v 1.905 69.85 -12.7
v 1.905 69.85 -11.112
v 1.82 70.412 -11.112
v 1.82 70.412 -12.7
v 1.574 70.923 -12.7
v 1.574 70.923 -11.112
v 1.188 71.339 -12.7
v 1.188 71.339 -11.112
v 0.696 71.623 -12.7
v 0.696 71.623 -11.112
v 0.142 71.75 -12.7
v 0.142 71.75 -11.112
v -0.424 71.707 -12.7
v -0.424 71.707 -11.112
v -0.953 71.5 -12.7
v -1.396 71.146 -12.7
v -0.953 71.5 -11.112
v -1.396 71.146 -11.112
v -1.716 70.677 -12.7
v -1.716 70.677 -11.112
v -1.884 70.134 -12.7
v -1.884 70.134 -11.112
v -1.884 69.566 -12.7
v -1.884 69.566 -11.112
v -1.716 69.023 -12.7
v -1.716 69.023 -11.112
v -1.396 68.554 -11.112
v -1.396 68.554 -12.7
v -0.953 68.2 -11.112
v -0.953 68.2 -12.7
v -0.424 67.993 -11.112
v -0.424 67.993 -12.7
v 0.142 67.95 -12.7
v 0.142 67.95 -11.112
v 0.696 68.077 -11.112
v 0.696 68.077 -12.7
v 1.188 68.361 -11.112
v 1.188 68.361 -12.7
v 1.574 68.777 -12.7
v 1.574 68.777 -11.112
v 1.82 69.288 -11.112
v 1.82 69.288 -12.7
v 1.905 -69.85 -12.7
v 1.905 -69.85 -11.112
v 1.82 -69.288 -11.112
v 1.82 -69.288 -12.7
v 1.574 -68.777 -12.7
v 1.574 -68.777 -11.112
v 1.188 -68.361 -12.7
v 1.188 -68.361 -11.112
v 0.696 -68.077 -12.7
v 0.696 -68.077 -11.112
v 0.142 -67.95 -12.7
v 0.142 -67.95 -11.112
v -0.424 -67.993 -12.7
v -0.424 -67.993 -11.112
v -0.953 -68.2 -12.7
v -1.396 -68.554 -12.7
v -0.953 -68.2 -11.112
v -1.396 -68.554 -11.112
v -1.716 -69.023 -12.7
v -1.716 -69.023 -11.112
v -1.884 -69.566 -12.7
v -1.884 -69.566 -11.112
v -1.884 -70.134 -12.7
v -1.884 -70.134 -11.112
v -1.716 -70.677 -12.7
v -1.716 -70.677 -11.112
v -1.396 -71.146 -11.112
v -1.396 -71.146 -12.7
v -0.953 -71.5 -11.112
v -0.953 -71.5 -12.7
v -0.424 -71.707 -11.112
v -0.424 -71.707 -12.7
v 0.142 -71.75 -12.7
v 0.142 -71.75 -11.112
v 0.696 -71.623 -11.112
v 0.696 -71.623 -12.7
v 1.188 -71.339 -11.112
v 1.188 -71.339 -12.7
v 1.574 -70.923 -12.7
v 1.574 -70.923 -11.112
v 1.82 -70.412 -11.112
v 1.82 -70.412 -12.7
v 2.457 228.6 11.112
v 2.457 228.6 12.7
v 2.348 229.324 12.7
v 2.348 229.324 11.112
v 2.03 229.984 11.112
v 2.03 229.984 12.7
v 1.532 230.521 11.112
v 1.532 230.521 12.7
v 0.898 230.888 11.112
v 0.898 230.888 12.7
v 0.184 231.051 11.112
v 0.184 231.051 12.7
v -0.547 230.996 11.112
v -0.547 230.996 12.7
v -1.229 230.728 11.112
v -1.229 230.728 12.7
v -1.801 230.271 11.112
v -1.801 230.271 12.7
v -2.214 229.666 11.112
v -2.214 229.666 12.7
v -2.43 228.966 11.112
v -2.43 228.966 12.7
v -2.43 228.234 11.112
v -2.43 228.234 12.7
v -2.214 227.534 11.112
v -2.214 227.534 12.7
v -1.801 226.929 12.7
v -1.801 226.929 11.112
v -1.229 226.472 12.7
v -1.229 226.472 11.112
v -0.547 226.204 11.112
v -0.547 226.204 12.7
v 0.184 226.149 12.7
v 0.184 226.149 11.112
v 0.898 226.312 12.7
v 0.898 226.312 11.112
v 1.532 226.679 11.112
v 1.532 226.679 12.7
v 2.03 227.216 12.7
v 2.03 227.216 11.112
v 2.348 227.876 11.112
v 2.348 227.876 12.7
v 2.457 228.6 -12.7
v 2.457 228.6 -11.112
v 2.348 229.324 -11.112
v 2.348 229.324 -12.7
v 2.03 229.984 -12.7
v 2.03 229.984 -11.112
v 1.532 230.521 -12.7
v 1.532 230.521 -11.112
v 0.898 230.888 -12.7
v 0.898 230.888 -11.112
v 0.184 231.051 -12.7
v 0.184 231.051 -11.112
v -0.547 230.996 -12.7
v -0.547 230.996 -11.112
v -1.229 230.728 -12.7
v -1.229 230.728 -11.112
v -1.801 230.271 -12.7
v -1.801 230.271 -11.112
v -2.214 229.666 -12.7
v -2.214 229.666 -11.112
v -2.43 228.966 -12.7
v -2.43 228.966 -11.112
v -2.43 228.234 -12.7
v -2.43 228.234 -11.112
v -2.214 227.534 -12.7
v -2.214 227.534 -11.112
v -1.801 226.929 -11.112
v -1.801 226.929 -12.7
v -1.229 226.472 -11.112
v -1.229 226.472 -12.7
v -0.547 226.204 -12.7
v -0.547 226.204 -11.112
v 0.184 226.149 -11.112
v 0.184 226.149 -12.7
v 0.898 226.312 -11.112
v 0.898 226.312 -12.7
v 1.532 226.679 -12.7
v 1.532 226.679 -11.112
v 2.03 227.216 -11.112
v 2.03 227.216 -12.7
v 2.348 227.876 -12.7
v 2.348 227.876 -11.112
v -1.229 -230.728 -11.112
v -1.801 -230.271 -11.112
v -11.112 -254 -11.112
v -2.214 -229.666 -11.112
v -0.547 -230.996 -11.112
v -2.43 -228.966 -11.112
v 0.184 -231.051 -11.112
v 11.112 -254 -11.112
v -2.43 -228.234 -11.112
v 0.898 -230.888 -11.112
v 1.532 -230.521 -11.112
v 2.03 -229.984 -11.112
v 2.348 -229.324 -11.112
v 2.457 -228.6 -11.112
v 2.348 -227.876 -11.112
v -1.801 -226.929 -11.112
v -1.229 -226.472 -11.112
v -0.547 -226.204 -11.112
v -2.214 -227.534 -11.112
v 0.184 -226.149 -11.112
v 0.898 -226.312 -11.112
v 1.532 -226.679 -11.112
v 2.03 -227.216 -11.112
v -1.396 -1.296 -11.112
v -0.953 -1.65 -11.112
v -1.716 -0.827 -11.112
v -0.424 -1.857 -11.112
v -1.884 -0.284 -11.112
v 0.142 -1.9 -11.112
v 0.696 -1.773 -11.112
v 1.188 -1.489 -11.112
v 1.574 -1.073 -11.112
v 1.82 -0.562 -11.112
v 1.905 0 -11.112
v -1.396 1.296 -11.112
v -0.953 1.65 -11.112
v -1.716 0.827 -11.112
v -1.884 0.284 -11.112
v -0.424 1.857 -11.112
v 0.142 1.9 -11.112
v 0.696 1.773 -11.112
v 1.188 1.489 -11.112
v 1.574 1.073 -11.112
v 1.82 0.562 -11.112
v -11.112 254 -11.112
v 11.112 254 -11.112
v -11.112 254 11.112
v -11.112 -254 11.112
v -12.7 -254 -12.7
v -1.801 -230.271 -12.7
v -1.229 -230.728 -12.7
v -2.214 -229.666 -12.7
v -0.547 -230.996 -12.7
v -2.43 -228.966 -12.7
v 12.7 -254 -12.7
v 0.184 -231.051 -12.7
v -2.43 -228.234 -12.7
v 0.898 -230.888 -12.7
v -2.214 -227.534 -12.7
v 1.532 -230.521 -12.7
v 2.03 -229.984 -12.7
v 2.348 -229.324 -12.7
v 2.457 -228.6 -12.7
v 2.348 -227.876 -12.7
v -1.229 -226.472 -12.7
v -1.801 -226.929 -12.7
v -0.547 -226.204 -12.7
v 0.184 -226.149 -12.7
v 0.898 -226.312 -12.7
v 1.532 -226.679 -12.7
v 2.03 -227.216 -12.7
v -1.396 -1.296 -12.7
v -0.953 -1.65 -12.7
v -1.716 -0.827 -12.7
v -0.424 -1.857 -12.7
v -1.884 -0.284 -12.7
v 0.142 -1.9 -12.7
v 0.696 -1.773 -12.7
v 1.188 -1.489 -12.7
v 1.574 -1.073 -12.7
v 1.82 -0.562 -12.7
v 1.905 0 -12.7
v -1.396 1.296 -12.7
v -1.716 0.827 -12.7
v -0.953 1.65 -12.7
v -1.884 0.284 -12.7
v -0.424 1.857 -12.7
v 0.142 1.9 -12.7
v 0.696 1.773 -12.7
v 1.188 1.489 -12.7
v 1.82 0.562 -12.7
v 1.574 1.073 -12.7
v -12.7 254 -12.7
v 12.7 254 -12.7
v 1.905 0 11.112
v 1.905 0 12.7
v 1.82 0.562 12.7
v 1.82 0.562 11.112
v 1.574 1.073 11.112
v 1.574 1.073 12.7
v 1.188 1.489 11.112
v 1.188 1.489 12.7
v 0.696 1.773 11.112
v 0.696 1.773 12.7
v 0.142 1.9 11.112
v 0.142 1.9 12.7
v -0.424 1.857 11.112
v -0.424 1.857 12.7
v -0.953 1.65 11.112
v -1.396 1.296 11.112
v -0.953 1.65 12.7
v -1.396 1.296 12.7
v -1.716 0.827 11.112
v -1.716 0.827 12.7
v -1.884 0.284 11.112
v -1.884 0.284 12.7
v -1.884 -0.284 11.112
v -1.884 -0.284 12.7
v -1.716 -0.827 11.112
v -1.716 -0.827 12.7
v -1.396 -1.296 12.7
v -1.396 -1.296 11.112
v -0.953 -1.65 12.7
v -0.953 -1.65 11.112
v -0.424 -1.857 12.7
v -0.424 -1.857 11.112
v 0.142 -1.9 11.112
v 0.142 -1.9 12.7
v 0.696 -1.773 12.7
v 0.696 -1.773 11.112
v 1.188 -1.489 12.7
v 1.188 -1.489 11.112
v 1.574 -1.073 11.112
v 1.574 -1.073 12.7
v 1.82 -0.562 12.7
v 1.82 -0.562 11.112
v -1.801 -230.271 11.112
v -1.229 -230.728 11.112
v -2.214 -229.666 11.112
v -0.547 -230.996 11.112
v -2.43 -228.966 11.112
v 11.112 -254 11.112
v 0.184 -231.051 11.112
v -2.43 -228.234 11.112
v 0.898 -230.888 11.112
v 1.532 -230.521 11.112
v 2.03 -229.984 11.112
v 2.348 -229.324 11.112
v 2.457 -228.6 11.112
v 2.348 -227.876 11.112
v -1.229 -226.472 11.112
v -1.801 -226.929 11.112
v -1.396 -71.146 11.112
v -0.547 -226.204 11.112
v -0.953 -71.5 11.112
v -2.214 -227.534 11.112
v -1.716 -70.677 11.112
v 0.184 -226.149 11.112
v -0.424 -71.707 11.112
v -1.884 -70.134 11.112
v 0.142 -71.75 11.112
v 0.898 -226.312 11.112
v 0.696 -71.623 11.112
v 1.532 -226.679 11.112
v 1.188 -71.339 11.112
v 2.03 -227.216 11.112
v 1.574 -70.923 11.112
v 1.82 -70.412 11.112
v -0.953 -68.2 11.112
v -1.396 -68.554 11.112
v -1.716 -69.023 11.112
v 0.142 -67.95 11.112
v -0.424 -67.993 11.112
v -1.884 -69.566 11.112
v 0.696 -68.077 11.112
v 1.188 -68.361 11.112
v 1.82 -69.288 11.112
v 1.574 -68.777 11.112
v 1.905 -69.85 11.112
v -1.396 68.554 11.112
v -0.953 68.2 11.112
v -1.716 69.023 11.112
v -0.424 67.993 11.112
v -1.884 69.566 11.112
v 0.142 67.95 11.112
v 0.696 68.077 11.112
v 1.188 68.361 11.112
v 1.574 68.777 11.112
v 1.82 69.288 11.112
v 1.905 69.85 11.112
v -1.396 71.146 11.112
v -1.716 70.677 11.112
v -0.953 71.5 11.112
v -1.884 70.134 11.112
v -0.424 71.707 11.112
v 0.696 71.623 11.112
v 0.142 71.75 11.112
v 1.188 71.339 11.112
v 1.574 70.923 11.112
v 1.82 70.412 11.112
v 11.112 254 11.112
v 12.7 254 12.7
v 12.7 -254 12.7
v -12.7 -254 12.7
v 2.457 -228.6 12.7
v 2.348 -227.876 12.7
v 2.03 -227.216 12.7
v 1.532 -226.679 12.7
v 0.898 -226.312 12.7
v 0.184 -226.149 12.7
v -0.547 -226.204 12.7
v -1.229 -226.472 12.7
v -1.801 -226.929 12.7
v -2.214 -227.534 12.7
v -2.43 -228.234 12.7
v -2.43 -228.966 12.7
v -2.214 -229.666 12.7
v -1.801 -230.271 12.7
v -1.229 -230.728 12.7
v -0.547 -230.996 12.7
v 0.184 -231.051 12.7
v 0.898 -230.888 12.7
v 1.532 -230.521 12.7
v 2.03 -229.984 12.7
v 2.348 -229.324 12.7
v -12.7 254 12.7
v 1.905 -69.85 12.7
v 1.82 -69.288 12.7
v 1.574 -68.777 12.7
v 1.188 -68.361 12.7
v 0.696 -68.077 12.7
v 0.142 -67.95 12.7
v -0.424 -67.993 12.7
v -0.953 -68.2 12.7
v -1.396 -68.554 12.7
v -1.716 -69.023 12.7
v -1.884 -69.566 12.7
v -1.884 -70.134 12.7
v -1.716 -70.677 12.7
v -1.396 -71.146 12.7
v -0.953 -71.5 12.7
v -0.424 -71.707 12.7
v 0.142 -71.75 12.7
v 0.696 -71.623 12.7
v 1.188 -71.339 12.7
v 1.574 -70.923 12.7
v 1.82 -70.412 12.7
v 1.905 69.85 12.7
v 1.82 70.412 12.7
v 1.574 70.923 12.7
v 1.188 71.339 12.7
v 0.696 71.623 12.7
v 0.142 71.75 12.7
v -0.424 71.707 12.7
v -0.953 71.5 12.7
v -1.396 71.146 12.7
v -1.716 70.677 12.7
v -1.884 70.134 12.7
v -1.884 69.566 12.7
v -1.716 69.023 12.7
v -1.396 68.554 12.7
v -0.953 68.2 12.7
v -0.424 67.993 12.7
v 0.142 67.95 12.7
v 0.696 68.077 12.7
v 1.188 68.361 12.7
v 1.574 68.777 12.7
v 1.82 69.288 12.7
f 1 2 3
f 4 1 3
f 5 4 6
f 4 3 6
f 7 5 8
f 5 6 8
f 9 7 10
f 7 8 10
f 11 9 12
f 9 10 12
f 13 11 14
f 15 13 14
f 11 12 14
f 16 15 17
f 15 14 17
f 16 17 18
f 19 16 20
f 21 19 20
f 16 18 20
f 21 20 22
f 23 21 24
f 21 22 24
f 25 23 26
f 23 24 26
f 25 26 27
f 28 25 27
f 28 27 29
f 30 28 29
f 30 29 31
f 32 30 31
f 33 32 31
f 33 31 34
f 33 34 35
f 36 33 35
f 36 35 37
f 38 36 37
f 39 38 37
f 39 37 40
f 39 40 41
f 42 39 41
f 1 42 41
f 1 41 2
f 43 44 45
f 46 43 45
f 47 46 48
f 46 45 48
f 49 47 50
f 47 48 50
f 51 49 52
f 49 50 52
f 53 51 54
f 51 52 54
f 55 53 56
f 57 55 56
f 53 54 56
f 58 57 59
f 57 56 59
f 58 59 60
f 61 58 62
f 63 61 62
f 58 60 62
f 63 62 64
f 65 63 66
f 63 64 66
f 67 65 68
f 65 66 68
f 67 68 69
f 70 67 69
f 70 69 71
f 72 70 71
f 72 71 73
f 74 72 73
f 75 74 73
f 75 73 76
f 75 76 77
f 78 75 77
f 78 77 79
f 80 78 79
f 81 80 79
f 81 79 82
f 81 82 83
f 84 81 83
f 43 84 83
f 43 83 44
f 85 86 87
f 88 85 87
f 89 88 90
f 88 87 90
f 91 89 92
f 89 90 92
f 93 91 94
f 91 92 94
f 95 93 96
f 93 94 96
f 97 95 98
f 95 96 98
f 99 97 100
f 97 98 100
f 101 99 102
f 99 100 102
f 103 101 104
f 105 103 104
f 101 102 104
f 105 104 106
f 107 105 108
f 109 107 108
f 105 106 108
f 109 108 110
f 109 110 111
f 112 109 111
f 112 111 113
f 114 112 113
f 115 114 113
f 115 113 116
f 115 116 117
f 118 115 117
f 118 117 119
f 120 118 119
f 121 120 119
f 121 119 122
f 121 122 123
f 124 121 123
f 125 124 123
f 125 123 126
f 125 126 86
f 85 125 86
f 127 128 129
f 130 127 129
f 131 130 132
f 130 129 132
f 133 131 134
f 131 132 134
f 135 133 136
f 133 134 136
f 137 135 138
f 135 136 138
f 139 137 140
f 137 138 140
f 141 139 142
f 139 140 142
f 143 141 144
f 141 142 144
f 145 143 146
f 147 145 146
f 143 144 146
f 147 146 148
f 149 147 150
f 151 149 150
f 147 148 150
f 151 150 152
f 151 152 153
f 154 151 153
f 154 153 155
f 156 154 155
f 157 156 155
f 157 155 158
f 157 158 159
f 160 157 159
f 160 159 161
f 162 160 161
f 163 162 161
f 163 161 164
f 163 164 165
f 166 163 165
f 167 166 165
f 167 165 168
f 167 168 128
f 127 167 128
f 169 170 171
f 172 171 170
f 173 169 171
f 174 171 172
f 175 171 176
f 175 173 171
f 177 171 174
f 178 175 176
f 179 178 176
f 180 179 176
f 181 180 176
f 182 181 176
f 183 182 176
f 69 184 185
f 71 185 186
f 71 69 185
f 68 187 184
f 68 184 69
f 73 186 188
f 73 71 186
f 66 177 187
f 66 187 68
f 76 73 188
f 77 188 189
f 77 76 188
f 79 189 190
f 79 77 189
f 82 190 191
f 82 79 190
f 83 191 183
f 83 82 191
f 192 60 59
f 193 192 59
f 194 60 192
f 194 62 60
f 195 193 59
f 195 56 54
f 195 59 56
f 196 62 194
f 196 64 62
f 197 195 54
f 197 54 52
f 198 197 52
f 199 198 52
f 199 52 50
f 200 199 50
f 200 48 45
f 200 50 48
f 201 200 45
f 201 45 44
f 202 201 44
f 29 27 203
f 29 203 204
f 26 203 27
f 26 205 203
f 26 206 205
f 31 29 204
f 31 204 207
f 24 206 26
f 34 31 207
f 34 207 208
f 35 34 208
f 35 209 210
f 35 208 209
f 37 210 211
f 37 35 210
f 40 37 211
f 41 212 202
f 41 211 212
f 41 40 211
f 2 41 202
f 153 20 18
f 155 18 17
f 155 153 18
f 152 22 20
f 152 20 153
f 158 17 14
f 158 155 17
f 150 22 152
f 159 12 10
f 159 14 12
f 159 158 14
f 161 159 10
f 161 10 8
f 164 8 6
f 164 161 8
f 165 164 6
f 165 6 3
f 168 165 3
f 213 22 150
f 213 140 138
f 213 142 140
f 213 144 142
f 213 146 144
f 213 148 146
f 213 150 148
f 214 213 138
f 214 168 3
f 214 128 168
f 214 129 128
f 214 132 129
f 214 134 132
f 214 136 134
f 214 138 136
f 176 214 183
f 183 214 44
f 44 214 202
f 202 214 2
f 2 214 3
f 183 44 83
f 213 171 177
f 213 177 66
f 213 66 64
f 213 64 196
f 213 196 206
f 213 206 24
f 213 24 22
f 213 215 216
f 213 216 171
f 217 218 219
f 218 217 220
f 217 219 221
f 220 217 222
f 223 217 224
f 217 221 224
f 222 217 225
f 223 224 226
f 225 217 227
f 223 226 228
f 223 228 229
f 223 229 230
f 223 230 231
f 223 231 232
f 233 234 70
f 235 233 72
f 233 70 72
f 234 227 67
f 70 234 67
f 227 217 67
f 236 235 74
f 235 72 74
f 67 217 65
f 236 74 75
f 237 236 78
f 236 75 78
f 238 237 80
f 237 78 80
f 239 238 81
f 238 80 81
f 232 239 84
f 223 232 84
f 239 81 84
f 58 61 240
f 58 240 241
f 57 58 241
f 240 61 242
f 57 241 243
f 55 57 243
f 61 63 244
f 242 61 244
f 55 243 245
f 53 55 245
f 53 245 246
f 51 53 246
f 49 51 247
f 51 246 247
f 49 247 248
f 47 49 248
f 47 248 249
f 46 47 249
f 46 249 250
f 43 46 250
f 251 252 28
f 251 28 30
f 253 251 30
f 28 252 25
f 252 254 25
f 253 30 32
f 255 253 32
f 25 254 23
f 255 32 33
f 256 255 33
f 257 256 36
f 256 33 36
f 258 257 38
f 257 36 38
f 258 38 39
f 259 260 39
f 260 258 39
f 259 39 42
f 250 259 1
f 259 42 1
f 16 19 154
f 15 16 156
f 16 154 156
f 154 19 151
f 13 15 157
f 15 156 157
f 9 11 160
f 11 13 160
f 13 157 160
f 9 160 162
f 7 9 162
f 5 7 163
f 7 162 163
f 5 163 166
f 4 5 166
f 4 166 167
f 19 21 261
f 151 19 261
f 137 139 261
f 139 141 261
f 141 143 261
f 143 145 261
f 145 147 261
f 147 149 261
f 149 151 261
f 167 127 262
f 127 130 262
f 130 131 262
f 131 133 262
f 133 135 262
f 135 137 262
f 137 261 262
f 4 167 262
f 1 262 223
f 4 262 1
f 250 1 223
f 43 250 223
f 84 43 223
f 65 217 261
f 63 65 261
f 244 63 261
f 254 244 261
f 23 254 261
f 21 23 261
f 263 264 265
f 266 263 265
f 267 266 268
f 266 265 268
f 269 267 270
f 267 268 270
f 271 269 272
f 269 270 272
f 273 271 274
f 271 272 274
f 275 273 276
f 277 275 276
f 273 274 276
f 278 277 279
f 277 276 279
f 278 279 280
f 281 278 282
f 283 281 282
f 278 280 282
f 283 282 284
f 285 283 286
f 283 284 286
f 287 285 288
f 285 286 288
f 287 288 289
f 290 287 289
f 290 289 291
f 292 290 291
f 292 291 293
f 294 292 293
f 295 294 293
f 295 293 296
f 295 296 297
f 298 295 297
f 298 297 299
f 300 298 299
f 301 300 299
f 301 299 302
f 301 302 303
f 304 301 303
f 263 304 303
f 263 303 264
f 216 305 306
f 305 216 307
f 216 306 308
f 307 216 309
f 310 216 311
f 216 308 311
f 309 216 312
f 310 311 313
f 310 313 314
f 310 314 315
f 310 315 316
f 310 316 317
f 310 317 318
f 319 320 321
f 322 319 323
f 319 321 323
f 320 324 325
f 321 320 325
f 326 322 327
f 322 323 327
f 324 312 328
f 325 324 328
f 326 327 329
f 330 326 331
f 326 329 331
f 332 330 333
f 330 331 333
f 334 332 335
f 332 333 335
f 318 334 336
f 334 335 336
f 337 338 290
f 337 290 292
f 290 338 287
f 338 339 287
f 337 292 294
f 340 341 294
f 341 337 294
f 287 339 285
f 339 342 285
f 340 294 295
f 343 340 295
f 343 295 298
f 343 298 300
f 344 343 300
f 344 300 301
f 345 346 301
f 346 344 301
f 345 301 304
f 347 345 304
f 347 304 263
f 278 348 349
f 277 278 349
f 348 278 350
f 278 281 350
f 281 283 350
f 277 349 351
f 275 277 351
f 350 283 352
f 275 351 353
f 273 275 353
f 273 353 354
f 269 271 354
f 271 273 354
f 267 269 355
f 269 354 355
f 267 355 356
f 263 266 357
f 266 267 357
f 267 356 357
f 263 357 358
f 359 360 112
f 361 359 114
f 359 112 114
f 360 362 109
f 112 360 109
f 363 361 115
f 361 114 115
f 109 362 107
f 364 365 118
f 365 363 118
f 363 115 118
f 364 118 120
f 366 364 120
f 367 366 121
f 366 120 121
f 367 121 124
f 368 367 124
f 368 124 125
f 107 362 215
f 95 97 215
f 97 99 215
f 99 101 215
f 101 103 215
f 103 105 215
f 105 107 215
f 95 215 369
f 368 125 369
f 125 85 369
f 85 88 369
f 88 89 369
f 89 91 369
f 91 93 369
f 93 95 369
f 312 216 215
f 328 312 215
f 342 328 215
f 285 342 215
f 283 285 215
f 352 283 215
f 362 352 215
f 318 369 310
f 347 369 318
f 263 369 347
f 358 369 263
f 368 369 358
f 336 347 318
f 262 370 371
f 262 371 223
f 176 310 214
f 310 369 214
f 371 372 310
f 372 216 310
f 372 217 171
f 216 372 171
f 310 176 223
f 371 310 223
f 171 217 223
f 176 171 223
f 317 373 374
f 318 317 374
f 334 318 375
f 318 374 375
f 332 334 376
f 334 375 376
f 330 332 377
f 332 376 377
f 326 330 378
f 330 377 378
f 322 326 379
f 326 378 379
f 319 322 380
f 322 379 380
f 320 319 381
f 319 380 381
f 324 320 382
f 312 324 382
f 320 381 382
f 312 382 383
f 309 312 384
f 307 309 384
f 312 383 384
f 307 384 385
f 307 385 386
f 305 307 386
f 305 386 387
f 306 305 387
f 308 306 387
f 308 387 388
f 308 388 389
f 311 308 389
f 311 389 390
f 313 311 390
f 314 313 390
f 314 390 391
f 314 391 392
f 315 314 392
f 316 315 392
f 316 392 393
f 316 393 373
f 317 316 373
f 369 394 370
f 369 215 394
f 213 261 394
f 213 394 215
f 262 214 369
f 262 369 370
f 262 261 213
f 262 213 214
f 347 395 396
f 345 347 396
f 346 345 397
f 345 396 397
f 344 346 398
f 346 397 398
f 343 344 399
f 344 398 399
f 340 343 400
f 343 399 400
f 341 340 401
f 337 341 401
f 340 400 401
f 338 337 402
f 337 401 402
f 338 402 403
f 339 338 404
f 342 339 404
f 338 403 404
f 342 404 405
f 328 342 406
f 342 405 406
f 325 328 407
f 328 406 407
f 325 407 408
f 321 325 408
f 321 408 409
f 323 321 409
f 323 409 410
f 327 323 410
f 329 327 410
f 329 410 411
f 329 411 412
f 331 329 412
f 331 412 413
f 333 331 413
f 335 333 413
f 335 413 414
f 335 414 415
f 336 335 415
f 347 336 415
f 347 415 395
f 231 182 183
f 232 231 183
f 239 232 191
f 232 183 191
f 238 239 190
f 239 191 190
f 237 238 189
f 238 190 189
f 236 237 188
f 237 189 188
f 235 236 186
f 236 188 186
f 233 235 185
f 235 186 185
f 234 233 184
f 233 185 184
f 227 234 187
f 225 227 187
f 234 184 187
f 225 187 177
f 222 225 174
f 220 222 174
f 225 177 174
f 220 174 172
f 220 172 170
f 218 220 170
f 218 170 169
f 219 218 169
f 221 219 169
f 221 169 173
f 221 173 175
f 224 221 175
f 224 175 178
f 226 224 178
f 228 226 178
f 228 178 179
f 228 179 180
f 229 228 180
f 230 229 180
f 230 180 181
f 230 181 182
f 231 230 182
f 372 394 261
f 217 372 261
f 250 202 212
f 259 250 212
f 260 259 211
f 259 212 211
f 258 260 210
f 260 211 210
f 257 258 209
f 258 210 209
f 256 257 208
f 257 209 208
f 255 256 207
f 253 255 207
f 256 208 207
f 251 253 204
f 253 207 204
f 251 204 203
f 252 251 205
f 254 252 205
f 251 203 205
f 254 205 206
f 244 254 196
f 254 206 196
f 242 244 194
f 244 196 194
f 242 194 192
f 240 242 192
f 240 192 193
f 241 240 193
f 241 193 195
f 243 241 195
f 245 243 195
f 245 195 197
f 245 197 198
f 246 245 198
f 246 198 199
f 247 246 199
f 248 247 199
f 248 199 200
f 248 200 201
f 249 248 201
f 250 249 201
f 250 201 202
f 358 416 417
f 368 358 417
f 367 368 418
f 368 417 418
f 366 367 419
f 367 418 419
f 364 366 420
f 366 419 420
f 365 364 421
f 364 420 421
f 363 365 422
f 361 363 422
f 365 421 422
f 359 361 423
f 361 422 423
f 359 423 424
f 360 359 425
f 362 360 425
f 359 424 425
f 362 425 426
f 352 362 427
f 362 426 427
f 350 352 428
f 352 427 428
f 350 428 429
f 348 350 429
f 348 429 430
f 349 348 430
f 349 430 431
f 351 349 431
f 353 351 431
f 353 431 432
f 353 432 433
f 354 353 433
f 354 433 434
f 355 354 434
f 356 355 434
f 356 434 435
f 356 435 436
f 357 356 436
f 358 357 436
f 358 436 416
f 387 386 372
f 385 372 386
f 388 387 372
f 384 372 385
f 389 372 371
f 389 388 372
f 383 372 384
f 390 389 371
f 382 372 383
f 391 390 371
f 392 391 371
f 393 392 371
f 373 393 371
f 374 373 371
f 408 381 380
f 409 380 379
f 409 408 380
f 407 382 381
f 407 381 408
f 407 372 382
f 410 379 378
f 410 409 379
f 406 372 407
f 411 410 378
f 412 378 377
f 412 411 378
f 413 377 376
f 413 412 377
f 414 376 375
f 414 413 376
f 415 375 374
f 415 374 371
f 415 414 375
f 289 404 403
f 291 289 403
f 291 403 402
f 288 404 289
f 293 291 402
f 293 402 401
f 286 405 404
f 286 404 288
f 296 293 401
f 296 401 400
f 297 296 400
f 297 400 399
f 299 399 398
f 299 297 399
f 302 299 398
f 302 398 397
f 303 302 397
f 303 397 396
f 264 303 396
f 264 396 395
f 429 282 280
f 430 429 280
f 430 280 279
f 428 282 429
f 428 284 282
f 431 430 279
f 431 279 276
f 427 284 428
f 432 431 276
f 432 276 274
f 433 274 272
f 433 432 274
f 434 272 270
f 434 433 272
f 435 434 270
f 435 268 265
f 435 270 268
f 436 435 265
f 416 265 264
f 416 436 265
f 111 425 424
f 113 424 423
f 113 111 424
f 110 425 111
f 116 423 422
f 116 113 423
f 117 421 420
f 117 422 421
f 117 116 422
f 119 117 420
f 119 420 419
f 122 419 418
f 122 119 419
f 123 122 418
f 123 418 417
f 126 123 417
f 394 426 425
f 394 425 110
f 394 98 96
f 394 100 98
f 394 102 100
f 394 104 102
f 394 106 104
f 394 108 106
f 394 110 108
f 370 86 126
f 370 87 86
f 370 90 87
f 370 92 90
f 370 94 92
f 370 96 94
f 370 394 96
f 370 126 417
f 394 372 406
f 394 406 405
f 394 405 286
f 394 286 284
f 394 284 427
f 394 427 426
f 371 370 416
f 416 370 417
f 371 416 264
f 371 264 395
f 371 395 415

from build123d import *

# Parameters (mm, degrees)
SKETCH1_W                        = 25.4
SKETCH1_H                        = 25.4
SKETCH1_W_2                      = 22.225
SKETCH1_H_2                      = 22.225
BOSS_EXTRUDE1_DEPTH              = 254
F_10_0_1935_DIAMETER_HOLE1_D     = 4.9149
F_10_0_1935_DIAMETER_HOLE1_DEPTH = 50.8
F_10_0_1935_DIAMETER_HOLE1_TIP   = 1.476584928
SKETCH6_R                        = 1.905
CUT_EXTRUDE1_DEPTH               = 256.582569828


with BuildPart() as part:
    # Sketch1 → Boss-Extrude1 (new, symmetric)
    with BuildSketch(Plane(origin=(0, 0, 0), x_dir=(1, 0, 0), z_dir=(0, 1, 0))):
        Rectangle(SKETCH1_W, SKETCH1_H)
        Rectangle(SKETCH1_W_2, SKETCH1_H_2, mode=Mode.SUBTRACT)
    extrude(amount=BOSS_EXTRUDE1_DEPTH, both=True)

    # #10 (0.1935) Diameter Hole1
    with Locations(Plane(origin=(0, 0, -12.7), x_dir=(-1, 0, 0), z_dir=(0, 0, -1))):
        with Locations((0, 228.6), (0, -228.6)):
            Hole(F_10_0_1935_DIAMETER_HOLE1_D / 2, depth=F_10_0_1935_DIAMETER_HOLE1_DEPTH)
            with Locations((0, 0, -(F_10_0_1935_DIAMETER_HOLE1_DEPTH + F_10_0_1935_DIAMETER_HOLE1_TIP / 2))):  # 118° drill point
                Cone(0, F_10_0_1935_DIAMETER_HOLE1_D / 2, F_10_0_1935_DIAMETER_HOLE1_TIP, mode=Mode.SUBTRACT)

    # Sketch6 → Cut-Extrude1 (cut, through all)
    with BuildSketch(Plane.XY.offset(12.7)):
        with Locations((0, -69.85)):
            Circle(SKETCH6_R)
        Circle(SKETCH6_R)
        with Locations((0, 69.85)):
            Circle(SKETCH6_R)
    extrude(amount=-CUT_EXTRUDE1_DEPTH, mode=Mode.SUBTRACT)


solid = part.part
